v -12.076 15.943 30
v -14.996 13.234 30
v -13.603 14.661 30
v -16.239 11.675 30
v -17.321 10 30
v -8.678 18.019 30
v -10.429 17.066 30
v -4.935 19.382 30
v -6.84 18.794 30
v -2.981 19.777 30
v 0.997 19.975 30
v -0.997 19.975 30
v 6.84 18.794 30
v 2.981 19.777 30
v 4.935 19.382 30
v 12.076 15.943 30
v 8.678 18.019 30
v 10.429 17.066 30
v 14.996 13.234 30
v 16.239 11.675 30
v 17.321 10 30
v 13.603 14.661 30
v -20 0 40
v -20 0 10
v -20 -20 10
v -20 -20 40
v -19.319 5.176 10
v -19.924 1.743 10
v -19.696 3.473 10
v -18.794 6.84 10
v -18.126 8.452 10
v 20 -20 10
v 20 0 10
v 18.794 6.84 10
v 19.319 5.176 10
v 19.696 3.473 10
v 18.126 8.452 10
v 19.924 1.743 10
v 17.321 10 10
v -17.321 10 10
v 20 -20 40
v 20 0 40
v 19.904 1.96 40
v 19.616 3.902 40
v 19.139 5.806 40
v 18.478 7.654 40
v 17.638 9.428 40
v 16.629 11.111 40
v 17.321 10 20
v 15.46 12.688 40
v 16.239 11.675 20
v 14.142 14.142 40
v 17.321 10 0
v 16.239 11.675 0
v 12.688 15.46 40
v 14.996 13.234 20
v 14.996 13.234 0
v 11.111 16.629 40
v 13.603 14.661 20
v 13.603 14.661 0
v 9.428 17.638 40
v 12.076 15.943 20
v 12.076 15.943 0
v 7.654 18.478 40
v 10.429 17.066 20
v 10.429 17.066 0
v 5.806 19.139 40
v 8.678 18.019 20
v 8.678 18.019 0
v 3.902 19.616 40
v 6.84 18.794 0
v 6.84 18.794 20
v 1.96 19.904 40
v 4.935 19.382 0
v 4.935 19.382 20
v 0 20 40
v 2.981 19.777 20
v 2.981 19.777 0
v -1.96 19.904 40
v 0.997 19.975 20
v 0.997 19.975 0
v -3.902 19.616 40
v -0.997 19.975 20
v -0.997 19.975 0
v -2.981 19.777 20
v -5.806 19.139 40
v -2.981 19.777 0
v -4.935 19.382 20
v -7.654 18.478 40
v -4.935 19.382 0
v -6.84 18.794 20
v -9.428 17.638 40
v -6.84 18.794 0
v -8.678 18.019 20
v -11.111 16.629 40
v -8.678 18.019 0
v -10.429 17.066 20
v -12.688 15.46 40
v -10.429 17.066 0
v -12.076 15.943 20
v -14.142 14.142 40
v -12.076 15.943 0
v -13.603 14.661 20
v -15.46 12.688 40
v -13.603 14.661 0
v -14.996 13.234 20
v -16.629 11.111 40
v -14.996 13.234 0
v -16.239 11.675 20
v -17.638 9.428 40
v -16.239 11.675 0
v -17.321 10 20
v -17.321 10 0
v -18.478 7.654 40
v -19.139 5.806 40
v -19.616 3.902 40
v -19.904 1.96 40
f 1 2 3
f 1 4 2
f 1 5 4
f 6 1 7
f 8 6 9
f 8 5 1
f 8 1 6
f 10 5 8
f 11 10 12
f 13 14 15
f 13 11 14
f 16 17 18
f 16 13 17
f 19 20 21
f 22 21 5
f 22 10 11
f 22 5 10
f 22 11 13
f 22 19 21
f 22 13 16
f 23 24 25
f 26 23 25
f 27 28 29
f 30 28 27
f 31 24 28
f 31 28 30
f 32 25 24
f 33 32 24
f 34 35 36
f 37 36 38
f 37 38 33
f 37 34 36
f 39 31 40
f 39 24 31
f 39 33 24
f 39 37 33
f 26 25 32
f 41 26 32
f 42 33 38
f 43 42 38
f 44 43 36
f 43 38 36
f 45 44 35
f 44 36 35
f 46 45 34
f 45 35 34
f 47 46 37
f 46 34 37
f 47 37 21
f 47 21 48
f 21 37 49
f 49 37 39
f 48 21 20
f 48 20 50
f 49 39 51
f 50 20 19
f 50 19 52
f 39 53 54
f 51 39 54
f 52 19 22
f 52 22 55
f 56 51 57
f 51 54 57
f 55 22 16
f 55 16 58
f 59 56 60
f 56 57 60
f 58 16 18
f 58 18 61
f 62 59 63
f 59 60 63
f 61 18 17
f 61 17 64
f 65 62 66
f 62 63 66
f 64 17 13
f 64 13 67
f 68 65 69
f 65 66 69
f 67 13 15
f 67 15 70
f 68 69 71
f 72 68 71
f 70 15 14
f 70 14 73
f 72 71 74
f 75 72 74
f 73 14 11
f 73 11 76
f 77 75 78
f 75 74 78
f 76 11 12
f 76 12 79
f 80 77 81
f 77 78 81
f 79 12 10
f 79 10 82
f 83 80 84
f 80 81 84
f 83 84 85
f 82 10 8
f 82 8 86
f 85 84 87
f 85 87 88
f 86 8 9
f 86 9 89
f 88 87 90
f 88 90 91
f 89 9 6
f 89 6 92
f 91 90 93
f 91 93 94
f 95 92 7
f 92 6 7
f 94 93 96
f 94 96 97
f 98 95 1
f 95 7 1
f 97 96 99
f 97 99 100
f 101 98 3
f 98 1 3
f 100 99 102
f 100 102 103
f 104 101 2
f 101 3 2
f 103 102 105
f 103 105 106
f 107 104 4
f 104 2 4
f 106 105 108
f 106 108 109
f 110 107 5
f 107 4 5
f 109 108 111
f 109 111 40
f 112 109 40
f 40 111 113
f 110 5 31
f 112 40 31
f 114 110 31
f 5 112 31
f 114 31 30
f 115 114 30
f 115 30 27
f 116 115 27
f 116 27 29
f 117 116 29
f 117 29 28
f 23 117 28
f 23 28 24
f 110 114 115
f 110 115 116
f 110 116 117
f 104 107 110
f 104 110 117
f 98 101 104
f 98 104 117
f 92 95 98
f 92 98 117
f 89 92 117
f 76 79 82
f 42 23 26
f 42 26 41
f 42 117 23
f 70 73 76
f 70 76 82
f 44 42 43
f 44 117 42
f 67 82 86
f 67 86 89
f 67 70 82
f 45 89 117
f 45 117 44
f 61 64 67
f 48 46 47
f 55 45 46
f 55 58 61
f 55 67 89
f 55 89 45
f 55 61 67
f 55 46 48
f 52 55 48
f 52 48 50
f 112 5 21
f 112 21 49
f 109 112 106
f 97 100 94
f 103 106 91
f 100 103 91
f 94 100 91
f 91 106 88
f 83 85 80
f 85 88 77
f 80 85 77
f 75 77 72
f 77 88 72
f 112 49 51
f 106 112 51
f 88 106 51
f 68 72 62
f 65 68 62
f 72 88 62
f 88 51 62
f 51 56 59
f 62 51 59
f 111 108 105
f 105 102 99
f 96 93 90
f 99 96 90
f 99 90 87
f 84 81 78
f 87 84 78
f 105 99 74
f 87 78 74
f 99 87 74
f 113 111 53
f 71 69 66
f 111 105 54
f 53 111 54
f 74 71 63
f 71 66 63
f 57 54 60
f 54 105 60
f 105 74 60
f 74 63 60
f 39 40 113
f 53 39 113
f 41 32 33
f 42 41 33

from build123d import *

# Parameters (mm, degrees)
BOSS_EXTRUDE1_DEPTH     = 40
SKETCH2_W               = 10
SKETCH2_H               = 30
SKETCH2_H_2             = 10
CUT_EXTRUDE1_DEPTH      = 40
CUT_EXTRUDE1_DEPTH_BACK = 40


with BuildPart() as part:
    # Sketch1 → Boss-Extrude1 (new body)
    with BuildSketch(Plane.XY):
        with BuildLine():
            Line((-20, 0), (-20, -20))
            Line((-20, -20), (20, -20))
            Line((20, -20), (20, 0))
            ThreePointArc((20, 0), (0, 20), (-20, 0))
        make_face()
    extrude(amount=BOSS_EXTRUDE1_DEPTH)

    # Sketch2 → Cut-Extrude1 (cut, two sides)
    with BuildSketch(Plane(origin=(0, 0, 0), x_dir=(0, 0, -1), z_dir=(1, 0, 0))) as cut_extrude1_sk:
        with Locations((-5, -5)):
            Rectangle(SKETCH2_W, SKETCH2_H)
        with Locations((-25, 15)):
            Rectangle(SKETCH2_W, SKETCH2_H_2)
    extrude(amount=CUT_EXTRUDE1_DEPTH, mode=Mode.SUBTRACT)
    extrude(cut_extrude1_sk.sketch, amount=-CUT_EXTRUDE1_DEPTH_BACK, mode=Mode.SUBTRACT)


solid = part.part
